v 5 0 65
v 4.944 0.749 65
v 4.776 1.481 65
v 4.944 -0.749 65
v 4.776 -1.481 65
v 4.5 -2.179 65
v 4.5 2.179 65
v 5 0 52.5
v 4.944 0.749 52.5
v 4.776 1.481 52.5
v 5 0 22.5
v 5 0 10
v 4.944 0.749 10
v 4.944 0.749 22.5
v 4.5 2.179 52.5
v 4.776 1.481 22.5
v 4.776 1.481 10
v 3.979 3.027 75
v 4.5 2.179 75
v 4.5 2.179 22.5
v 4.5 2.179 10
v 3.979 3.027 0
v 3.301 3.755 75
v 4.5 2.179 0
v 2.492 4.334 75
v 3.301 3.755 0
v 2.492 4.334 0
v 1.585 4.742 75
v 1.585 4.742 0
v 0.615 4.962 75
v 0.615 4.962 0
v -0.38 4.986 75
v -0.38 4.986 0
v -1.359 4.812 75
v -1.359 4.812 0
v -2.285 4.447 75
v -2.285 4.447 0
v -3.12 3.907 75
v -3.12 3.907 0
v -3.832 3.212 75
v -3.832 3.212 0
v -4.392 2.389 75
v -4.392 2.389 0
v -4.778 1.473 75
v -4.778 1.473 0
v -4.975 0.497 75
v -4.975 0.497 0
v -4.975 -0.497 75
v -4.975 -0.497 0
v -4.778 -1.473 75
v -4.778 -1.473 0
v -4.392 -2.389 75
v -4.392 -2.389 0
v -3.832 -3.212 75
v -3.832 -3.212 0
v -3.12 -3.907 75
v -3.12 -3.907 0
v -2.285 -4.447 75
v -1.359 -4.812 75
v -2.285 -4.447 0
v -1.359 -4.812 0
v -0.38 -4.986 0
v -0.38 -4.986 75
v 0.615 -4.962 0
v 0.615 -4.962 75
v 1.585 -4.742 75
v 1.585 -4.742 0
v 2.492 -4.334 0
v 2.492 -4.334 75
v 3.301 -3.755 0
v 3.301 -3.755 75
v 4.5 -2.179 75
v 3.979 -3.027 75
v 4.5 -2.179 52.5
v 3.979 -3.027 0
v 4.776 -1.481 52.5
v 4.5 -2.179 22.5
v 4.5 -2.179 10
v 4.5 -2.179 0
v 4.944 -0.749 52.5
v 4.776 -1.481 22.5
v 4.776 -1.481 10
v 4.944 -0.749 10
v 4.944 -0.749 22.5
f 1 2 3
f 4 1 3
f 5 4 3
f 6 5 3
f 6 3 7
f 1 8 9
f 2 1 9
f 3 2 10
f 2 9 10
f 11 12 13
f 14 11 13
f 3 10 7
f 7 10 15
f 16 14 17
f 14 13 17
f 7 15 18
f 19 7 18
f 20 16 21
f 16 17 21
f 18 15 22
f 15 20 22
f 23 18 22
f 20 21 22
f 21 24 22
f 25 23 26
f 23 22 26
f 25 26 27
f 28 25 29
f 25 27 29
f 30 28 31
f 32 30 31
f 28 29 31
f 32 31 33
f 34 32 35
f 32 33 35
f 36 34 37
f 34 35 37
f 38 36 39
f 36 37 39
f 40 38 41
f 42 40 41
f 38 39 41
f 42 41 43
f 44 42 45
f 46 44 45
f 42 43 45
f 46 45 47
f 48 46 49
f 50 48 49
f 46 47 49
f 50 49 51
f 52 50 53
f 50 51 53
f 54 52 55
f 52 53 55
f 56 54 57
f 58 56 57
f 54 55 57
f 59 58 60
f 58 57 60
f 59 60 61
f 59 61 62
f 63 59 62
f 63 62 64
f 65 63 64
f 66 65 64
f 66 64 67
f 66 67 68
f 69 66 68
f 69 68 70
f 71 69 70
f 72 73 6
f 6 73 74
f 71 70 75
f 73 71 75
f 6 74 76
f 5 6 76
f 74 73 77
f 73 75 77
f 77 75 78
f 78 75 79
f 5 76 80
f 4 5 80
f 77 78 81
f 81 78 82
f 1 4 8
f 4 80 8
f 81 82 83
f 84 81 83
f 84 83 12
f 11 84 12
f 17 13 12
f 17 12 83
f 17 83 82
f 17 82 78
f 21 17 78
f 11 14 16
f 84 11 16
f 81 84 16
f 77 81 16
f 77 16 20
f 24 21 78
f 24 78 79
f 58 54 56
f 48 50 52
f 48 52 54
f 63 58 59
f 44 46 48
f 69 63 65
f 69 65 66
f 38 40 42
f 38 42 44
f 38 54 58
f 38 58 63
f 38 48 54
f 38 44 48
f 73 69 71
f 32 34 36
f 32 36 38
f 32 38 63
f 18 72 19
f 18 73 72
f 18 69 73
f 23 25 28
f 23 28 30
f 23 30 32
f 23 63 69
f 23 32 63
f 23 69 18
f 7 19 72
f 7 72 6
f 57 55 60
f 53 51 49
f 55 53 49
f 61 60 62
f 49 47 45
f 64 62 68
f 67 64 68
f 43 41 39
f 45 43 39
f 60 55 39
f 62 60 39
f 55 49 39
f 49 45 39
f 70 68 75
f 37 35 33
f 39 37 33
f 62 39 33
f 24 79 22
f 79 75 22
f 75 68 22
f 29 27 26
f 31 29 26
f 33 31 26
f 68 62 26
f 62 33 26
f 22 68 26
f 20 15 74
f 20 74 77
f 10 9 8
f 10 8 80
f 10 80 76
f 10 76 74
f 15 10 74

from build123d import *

# Parameters (mm, degrees)
SKETCH_1_R          = 5
EXTRUDE_1_DEPTH     = 75
SKETCH_2_W          = 30
SKETCH_2_H          = 10
SKETCH_2_W_2        = 10
CUT_EXTRUDE_1_DEPTH = 0.5


with BuildPart() as part:
    # 草图1 → 凸台-拉伸1 (new body)
    with BuildSketch(Plane.XY):
        Circle(SKETCH_1_R)
    extrude(amount=EXTRUDE_1_DEPTH)

    # 草图2 → 切除-拉伸1 (cut)
    with BuildSketch(Plane(origin=(5, 0, 0), x_dir=(0, 0, -1), z_dir=(1, 0, 0))):
        with Locations((-37.5, 0)):
            Rectangle(SKETCH_2_W, SKETCH_2_H)
        with Locations((-70, 0)):
            Rectangle(SKETCH_2_W_2, SKETCH_2_H)
        with Locations((-5, 0)):
            Rectangle(SKETCH_2_W_2, SKETCH_2_H)
    extrude(amount=-CUT_EXTRUDE_1_DEPTH, mode=Mode.SUBTRACT)


solid = part.part
